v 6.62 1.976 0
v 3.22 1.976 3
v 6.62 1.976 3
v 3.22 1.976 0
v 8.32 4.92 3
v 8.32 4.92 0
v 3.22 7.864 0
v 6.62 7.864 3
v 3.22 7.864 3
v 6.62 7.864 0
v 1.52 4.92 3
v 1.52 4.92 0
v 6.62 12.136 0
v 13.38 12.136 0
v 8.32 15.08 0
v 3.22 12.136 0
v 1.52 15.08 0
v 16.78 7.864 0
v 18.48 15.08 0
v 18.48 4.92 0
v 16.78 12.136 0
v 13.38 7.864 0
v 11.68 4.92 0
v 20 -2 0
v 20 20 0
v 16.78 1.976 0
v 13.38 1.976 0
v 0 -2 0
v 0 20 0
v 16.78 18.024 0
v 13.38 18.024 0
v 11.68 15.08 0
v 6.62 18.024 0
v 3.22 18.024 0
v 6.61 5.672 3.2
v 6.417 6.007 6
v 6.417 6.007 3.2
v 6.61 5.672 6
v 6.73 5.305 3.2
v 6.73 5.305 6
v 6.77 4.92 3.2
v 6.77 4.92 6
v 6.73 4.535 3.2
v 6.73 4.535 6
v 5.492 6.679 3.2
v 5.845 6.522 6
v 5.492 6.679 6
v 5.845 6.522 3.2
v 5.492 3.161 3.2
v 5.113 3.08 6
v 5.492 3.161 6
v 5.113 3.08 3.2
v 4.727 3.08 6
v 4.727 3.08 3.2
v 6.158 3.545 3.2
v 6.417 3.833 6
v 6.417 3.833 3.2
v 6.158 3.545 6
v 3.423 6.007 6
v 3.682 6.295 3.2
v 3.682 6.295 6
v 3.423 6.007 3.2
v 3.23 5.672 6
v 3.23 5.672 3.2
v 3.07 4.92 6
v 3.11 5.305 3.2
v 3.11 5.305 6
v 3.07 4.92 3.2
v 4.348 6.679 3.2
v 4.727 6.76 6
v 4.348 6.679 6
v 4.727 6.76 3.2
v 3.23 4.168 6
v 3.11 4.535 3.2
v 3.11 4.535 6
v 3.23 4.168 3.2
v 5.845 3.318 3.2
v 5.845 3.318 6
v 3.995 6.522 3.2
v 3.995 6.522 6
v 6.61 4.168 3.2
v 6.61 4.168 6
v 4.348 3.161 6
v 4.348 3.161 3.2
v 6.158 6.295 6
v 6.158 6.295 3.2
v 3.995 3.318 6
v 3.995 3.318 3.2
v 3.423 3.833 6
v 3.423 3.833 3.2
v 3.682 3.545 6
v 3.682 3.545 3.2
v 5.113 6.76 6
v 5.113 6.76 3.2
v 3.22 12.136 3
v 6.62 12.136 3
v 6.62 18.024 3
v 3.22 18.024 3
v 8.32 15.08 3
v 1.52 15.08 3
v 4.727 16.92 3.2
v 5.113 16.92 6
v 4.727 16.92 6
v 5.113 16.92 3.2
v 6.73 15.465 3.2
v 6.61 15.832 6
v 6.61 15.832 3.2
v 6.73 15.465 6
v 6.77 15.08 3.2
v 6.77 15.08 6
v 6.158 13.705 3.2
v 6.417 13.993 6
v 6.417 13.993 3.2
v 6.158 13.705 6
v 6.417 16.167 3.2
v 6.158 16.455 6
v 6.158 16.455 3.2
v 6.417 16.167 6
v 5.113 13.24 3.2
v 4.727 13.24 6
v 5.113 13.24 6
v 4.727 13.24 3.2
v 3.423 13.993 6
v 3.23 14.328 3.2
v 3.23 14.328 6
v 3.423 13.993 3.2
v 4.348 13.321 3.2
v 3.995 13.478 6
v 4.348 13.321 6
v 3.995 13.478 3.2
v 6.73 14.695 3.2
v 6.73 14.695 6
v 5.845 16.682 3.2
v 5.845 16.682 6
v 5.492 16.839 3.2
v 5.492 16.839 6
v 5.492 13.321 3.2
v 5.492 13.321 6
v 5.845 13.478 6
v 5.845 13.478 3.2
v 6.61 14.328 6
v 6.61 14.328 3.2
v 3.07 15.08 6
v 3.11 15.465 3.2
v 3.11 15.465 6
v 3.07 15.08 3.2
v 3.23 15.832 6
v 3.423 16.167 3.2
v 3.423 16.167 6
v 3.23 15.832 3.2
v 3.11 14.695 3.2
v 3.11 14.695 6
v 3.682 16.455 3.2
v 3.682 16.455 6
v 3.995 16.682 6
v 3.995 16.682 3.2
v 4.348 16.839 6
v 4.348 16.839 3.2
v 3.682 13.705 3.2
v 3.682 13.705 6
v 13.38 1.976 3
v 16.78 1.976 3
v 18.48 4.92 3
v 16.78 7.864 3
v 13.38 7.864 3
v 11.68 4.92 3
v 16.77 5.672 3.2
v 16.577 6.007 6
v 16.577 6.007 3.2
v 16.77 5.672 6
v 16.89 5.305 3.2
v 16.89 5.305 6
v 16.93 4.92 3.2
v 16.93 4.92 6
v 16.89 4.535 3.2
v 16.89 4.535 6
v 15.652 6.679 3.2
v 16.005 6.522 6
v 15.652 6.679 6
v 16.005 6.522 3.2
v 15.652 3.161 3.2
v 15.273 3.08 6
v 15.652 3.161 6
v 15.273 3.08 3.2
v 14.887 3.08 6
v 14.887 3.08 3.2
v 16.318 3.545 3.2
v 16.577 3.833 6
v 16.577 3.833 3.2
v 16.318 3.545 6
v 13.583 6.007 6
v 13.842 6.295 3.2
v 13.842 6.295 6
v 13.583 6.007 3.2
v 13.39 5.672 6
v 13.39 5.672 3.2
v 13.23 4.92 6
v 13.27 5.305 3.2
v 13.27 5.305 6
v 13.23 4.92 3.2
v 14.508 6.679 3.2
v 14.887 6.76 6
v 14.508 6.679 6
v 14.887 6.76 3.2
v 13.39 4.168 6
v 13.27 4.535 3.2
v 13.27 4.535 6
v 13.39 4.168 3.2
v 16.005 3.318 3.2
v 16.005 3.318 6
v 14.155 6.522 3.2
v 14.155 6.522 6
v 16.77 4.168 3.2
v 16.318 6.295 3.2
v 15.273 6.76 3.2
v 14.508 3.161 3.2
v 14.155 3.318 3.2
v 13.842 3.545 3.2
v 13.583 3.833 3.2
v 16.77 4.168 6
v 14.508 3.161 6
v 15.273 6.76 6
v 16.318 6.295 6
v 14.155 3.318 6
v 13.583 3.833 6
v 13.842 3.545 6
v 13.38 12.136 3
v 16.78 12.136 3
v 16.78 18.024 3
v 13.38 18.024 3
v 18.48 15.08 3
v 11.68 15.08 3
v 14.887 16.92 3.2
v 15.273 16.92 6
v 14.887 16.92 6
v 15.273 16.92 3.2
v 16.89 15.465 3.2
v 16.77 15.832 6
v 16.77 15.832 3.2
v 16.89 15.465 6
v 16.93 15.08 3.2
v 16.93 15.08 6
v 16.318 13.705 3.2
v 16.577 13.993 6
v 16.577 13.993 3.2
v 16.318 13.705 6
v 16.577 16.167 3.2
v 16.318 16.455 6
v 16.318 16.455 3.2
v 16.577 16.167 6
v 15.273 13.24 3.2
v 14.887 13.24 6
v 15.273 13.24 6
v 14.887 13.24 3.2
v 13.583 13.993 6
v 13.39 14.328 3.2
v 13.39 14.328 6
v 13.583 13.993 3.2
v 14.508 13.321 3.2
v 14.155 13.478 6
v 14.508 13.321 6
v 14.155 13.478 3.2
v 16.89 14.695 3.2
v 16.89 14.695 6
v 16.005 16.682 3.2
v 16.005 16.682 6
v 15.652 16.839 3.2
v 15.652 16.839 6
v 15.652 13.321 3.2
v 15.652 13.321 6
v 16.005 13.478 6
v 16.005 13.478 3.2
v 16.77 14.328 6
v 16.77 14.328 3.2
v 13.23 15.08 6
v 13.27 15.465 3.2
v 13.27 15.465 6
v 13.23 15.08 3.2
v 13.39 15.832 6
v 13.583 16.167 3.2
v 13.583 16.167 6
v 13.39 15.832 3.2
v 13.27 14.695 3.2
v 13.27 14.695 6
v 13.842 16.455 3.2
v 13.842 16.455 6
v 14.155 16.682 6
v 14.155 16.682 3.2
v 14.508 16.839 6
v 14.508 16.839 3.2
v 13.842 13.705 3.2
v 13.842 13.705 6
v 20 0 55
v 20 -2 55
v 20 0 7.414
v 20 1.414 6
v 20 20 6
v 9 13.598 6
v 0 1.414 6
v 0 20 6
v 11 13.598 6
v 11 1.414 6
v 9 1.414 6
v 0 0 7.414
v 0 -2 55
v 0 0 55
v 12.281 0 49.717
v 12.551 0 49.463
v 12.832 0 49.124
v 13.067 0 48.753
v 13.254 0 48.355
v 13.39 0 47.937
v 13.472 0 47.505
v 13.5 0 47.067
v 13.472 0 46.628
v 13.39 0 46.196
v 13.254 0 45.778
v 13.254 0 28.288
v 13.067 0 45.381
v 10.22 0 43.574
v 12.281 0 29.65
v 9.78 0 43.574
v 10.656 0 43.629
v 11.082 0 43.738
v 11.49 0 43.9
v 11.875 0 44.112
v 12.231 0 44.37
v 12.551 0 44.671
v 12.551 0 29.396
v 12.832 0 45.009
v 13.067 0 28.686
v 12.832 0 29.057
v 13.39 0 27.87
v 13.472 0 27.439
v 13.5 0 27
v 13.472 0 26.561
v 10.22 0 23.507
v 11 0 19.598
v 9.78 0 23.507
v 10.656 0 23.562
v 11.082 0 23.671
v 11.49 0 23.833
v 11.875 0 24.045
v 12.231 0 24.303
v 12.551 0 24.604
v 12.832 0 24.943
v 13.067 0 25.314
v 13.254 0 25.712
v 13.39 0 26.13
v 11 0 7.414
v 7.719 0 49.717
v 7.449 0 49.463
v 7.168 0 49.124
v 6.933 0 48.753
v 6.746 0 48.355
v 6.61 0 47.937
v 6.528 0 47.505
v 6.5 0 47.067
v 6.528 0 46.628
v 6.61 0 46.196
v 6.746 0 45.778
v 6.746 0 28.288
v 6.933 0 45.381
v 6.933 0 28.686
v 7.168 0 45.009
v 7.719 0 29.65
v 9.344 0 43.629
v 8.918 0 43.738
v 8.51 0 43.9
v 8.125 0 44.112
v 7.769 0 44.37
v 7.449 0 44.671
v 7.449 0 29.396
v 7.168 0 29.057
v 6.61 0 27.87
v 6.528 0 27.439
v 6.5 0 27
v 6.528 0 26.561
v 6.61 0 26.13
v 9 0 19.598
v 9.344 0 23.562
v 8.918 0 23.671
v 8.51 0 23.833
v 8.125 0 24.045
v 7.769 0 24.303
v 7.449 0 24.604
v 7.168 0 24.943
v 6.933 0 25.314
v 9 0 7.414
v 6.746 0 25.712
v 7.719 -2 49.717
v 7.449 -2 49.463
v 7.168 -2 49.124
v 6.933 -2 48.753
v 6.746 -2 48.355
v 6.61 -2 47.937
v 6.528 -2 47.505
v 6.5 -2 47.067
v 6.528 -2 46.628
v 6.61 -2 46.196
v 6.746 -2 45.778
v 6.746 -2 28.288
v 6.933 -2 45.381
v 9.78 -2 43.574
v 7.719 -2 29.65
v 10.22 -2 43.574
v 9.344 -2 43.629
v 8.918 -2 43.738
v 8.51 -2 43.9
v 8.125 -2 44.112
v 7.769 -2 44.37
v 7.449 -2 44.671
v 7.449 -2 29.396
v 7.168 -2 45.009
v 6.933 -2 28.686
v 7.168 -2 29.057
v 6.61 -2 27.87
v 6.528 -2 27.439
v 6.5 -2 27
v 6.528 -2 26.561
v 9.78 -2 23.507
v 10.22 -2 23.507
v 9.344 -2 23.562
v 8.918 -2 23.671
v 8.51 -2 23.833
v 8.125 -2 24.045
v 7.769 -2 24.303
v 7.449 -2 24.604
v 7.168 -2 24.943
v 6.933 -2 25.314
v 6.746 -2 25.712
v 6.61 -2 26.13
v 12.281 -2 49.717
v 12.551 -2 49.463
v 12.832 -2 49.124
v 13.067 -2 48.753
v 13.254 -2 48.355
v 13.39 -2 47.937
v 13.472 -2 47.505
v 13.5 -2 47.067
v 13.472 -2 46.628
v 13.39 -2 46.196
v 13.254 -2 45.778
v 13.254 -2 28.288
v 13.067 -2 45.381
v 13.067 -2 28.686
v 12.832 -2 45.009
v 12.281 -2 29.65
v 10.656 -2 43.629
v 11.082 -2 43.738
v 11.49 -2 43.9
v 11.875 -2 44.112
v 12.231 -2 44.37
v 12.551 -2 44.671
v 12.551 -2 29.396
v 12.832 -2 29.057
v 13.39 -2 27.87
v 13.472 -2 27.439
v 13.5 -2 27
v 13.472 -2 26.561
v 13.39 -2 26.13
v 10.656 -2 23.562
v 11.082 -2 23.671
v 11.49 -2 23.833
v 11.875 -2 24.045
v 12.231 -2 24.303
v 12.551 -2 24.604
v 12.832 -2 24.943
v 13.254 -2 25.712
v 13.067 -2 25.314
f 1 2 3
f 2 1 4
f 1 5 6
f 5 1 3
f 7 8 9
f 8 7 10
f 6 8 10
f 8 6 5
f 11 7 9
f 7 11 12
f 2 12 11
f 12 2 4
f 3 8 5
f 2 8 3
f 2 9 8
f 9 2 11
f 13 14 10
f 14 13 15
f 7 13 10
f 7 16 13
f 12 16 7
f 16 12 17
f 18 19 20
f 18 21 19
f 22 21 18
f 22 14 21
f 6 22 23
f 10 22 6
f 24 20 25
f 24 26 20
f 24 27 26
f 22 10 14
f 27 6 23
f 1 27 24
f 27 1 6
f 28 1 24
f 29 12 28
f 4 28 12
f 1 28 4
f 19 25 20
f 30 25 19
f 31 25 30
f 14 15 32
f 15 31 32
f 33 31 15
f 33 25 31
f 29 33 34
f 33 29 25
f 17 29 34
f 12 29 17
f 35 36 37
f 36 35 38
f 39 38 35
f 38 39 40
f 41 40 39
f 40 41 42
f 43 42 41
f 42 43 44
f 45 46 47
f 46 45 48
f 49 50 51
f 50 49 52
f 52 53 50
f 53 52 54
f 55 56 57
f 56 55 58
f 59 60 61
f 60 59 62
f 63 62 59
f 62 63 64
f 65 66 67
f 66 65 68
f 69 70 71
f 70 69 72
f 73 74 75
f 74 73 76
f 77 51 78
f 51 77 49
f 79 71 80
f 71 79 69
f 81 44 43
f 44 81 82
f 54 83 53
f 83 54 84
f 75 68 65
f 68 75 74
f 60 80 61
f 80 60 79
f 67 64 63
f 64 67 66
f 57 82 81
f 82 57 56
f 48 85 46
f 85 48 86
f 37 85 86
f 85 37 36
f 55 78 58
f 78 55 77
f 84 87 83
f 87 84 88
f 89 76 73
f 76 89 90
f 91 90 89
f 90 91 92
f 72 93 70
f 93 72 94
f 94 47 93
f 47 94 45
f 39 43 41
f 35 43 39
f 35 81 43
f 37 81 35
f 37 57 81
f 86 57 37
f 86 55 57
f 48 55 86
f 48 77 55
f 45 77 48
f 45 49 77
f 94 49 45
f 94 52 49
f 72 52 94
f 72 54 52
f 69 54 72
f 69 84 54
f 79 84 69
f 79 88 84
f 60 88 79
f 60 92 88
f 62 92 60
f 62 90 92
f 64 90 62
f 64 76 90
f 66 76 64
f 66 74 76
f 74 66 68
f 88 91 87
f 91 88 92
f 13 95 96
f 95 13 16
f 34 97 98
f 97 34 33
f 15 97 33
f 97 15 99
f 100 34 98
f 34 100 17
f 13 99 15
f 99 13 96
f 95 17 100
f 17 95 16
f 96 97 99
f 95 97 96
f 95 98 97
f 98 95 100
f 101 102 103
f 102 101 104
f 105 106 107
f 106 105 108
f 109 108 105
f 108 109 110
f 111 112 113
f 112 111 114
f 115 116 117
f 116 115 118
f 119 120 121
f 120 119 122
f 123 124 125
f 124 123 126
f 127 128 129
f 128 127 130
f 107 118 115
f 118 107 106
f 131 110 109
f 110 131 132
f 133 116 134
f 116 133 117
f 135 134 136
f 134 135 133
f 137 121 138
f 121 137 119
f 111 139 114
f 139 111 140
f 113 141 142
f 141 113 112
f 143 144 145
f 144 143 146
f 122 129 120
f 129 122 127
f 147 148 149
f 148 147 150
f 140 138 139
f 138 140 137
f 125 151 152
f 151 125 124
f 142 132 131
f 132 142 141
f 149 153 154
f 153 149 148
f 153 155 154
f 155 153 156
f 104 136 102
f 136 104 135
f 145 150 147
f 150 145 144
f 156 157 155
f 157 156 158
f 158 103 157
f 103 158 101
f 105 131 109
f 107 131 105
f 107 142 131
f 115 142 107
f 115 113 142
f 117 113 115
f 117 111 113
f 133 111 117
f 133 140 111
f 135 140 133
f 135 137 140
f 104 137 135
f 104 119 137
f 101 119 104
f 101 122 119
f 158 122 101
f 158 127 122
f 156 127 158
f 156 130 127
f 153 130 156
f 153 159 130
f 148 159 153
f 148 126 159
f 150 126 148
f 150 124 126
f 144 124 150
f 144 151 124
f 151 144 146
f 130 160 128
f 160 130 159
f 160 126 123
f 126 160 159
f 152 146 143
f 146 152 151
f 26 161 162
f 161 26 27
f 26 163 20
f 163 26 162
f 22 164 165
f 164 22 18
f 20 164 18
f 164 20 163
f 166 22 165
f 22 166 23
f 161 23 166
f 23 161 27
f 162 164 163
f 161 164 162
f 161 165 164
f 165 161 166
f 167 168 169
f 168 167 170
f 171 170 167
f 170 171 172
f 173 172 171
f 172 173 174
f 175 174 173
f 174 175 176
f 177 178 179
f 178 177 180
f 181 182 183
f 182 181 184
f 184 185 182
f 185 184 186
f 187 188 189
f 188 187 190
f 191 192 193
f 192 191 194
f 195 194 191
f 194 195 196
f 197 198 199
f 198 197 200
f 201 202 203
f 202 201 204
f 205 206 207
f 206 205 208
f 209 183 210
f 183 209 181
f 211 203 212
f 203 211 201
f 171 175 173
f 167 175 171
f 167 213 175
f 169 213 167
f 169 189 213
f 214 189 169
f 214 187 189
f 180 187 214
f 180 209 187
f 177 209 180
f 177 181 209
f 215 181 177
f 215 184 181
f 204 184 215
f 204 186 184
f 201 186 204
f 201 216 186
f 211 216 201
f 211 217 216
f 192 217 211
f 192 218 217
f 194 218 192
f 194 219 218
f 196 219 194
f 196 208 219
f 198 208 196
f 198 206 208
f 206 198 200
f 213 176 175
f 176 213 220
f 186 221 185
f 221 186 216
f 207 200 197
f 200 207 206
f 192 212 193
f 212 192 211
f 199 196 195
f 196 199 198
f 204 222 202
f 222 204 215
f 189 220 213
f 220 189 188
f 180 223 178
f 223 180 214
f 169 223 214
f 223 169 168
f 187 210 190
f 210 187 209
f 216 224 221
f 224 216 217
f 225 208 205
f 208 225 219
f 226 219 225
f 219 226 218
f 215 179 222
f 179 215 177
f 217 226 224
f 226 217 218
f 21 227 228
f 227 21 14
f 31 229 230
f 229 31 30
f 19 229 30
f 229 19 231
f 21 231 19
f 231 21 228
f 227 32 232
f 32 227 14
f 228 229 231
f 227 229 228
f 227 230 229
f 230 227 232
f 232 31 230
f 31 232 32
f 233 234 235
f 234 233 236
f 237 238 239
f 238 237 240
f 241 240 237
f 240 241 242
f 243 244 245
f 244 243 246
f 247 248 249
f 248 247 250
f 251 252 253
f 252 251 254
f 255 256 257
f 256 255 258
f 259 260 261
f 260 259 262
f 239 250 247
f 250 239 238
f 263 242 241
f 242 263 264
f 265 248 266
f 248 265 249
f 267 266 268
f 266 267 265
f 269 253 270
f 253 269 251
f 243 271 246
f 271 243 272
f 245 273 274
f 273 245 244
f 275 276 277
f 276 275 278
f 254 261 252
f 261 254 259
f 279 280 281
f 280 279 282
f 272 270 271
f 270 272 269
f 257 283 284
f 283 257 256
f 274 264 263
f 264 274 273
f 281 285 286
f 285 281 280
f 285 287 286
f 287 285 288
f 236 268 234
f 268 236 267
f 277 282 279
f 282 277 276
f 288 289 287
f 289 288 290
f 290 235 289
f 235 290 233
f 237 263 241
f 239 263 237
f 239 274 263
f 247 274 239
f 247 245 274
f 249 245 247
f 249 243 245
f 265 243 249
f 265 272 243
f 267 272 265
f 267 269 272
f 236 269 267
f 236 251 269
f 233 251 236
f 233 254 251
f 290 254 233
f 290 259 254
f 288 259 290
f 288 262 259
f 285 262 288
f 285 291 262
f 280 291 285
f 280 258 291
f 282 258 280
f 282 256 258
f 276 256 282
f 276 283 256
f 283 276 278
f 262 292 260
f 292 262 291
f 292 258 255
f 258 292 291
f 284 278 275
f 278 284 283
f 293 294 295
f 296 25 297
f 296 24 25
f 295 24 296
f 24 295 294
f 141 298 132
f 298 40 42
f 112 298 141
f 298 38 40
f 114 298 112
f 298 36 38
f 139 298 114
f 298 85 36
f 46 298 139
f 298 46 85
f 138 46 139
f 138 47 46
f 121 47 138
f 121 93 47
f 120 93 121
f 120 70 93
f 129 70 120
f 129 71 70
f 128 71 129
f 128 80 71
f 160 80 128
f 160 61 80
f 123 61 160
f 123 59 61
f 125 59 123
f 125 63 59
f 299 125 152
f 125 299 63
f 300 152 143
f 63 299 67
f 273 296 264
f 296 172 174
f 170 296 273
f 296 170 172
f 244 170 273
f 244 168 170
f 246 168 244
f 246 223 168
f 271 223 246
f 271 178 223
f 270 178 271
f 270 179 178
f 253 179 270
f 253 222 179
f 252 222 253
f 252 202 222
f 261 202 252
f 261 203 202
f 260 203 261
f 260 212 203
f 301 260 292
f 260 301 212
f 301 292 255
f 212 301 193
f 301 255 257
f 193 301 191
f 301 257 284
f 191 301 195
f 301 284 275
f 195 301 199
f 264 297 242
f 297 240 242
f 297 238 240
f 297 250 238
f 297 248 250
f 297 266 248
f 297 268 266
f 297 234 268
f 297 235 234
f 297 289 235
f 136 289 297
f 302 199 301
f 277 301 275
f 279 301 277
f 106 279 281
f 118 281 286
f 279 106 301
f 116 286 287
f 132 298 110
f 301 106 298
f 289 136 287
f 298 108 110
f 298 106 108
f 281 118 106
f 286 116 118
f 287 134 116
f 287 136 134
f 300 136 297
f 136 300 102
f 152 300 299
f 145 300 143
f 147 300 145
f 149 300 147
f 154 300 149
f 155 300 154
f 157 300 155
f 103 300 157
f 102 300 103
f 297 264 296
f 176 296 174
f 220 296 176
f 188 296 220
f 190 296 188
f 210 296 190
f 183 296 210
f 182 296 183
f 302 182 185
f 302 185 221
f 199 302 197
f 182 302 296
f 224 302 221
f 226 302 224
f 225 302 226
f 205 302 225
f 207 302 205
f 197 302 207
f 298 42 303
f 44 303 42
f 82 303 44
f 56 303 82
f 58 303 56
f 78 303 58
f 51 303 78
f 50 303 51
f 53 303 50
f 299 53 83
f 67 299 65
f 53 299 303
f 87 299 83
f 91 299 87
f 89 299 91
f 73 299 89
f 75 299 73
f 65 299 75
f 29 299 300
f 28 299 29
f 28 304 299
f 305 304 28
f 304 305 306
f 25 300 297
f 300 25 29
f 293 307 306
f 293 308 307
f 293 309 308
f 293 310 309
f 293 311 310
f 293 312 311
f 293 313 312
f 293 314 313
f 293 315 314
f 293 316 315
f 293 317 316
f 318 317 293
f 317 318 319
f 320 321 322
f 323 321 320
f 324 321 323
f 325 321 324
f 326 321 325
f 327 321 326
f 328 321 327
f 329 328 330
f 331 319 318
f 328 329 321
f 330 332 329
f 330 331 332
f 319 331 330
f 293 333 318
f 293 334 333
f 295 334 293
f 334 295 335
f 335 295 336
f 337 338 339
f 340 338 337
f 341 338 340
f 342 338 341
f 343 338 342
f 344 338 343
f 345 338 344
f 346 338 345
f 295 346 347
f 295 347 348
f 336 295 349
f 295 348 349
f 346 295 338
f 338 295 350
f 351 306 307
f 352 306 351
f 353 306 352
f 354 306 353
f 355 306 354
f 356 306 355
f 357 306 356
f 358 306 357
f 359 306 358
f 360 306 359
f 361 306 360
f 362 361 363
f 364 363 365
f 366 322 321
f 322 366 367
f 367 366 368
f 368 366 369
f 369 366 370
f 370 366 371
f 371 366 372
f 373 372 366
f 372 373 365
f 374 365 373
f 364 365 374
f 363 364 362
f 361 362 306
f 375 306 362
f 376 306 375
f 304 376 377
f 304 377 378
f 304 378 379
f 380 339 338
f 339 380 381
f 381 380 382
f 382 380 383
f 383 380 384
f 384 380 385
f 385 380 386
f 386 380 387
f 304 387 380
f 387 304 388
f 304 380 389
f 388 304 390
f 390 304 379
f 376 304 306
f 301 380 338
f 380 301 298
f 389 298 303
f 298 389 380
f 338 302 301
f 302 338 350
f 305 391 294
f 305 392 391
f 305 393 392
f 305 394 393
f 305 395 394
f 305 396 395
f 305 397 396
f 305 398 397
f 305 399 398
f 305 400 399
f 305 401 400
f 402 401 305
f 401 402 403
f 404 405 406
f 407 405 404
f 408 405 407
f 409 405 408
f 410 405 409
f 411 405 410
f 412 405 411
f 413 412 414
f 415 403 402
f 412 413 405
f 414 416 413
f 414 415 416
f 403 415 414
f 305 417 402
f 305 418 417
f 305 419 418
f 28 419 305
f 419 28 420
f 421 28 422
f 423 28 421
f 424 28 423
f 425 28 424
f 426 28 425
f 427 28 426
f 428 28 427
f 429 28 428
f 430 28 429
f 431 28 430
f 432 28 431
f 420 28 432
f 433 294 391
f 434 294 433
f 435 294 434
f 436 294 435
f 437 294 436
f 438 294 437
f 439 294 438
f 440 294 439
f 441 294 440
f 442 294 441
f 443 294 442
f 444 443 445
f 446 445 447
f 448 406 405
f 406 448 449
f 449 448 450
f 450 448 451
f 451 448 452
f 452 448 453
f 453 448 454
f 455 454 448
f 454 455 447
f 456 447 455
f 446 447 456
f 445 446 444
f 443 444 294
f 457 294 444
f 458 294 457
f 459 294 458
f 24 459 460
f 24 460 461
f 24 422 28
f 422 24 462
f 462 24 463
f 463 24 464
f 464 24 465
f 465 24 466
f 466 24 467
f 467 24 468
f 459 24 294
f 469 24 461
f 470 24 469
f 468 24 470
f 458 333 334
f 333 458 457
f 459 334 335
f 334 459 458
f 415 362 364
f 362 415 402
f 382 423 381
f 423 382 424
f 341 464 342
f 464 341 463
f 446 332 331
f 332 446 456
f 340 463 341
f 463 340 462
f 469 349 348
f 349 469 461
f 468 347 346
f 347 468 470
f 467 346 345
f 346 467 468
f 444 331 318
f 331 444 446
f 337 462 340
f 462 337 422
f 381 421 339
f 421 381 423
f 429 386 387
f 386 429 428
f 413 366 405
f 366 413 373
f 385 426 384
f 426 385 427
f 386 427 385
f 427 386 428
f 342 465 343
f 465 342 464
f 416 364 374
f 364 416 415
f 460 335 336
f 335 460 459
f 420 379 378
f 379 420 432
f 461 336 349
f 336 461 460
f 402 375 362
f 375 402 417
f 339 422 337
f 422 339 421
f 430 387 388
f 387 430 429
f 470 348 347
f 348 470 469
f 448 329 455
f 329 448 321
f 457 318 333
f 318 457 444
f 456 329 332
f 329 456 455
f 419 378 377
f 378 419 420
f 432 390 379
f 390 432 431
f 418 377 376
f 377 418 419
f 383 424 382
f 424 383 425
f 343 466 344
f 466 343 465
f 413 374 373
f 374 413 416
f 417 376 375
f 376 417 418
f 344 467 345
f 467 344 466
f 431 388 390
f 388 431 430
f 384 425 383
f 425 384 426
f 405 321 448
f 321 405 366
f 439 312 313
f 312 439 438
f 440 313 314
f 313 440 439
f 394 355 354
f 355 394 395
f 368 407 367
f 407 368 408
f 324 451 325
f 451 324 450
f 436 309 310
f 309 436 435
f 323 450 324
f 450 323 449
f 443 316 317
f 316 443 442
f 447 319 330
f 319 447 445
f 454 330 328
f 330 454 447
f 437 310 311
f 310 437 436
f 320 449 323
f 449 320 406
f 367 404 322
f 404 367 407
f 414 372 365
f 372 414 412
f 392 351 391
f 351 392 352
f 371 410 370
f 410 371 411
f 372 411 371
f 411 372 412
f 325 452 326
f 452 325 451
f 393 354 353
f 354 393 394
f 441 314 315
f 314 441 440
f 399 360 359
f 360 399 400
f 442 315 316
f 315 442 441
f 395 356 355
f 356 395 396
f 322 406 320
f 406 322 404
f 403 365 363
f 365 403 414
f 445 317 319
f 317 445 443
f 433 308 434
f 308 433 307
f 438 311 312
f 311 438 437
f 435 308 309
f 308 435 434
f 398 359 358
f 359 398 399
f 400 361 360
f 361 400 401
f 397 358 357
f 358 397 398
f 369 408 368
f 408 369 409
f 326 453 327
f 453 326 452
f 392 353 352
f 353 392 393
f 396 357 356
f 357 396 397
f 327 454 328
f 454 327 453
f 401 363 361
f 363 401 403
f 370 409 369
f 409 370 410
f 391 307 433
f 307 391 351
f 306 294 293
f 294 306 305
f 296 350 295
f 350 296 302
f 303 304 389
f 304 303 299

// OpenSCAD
//use<Write.scad>
$fn=100;

x_size = 20;           // horizontal outer size of the pedestal. 
y_size = 20;           // 
nut_size = 6.8;
SMA_dia = 7.0;
SMA_flat = 3.15;
thickness = 6;         //
wall_thickness = 2;
height = 55;

mount_hole = 3.7;
clear = 0.175;

MLAB_grid = 10.16;

x_holes = floor(x_size / MLAB_grid);
y_holes = floor(y_size / MLAB_grid);

MLAB_grid_xoffset = (x_size - (x_holes * MLAB_grid))/2;
MLAB_grid_yoffset = (y_size - (y_holes * MLAB_grid))/2;

//Top part

union () {

    difference () {
                cube([x_size, y_size , thickness ]);

// MLAB grid holes
        grid_list = [for (j = [MLAB_grid_xoffset : MLAB_grid: x_size], i = [MLAB_grid_yoffset :MLAB_grid: y_size])  [j, i] ];
            
        for (j = grid_list) {
                translate (concat(j, [0]))
                    cylinder (h = 3, r= nut_size/2, $fn=6);
                translate (concat(j, [3.2]))  // one solid layer for slicer (the holes will be pierced on demand )
                    cylinder (h = thickness, r= mount_hole/2, $fn=30);
                //translate (concat(j, [6.0]))
                //    cylinder (h = 10, r= nut_size/2, $fn=6);
        }  
    };
// vertical to horizontal brick connection
    translate ([ 0, 0, thickness - sqrt(2 * wall_thickness*wall_thickness) / 2])  // move to correct positon on square diagonal  
        rotate([45,0,0])
            cube([x_size, wall_thickness , wall_thickness ]);
// rib
    difference()
    {
        translate ([ (x_size / 2) - wall_thickness / 2, 0, -y_size ])  // move to correct positon on square diagonal  
            rotate([45,0,0])
                cube([wall_thickness, y_size*1.4, y_size*1.4]);
        translate ([ 0, -y_size , -thickness * 4]) cube([2*x_size, 2*y_size , thickness * 4 ]);
        translate ([ 0, -y_size - wall_thickness, 0]) cube([x_size, y_size , thickness * 3 ]);
    };
    
    difference  () {

        translate ([0, -wall_thickness, 0])    // vertical brick
            cube([y_size, wall_thickness , height ]);
        
// SMA connector hole
        translate ([ x_size/2, wall_thickness/2, 1.5*(height - thickness)/3  + thickness - SMA_dia/2])    
            rotate([90,0,0]) {
                difference  () {
                    cylinder (h = 2*wall_thickness, r= SMA_dia/2, $fn=50);
                        translate([ 0, SMA_flat , wall_thickness/2 + wall_thickness ]) 
                            cube([SMA_dia, 1 , thickness ], center=true);
                }
            }

        translate ([ x_size/2, wall_thickness/2, 2.3*(height - thickness)/3  + thickness  + SMA_dia/2 ])    
            rotate([90,0,0]){
                difference  () {
                    cylinder (h = 2*wall_thickness, r= SMA_dia/2, $fn=50);
                        translate([ 0, SMA_flat , wall_thickness/2 + wall_thickness ]) 
                            cube([SMA_dia, 1 , thickness ], center=true);
                }
 
           }
           
    }
               
           
}
